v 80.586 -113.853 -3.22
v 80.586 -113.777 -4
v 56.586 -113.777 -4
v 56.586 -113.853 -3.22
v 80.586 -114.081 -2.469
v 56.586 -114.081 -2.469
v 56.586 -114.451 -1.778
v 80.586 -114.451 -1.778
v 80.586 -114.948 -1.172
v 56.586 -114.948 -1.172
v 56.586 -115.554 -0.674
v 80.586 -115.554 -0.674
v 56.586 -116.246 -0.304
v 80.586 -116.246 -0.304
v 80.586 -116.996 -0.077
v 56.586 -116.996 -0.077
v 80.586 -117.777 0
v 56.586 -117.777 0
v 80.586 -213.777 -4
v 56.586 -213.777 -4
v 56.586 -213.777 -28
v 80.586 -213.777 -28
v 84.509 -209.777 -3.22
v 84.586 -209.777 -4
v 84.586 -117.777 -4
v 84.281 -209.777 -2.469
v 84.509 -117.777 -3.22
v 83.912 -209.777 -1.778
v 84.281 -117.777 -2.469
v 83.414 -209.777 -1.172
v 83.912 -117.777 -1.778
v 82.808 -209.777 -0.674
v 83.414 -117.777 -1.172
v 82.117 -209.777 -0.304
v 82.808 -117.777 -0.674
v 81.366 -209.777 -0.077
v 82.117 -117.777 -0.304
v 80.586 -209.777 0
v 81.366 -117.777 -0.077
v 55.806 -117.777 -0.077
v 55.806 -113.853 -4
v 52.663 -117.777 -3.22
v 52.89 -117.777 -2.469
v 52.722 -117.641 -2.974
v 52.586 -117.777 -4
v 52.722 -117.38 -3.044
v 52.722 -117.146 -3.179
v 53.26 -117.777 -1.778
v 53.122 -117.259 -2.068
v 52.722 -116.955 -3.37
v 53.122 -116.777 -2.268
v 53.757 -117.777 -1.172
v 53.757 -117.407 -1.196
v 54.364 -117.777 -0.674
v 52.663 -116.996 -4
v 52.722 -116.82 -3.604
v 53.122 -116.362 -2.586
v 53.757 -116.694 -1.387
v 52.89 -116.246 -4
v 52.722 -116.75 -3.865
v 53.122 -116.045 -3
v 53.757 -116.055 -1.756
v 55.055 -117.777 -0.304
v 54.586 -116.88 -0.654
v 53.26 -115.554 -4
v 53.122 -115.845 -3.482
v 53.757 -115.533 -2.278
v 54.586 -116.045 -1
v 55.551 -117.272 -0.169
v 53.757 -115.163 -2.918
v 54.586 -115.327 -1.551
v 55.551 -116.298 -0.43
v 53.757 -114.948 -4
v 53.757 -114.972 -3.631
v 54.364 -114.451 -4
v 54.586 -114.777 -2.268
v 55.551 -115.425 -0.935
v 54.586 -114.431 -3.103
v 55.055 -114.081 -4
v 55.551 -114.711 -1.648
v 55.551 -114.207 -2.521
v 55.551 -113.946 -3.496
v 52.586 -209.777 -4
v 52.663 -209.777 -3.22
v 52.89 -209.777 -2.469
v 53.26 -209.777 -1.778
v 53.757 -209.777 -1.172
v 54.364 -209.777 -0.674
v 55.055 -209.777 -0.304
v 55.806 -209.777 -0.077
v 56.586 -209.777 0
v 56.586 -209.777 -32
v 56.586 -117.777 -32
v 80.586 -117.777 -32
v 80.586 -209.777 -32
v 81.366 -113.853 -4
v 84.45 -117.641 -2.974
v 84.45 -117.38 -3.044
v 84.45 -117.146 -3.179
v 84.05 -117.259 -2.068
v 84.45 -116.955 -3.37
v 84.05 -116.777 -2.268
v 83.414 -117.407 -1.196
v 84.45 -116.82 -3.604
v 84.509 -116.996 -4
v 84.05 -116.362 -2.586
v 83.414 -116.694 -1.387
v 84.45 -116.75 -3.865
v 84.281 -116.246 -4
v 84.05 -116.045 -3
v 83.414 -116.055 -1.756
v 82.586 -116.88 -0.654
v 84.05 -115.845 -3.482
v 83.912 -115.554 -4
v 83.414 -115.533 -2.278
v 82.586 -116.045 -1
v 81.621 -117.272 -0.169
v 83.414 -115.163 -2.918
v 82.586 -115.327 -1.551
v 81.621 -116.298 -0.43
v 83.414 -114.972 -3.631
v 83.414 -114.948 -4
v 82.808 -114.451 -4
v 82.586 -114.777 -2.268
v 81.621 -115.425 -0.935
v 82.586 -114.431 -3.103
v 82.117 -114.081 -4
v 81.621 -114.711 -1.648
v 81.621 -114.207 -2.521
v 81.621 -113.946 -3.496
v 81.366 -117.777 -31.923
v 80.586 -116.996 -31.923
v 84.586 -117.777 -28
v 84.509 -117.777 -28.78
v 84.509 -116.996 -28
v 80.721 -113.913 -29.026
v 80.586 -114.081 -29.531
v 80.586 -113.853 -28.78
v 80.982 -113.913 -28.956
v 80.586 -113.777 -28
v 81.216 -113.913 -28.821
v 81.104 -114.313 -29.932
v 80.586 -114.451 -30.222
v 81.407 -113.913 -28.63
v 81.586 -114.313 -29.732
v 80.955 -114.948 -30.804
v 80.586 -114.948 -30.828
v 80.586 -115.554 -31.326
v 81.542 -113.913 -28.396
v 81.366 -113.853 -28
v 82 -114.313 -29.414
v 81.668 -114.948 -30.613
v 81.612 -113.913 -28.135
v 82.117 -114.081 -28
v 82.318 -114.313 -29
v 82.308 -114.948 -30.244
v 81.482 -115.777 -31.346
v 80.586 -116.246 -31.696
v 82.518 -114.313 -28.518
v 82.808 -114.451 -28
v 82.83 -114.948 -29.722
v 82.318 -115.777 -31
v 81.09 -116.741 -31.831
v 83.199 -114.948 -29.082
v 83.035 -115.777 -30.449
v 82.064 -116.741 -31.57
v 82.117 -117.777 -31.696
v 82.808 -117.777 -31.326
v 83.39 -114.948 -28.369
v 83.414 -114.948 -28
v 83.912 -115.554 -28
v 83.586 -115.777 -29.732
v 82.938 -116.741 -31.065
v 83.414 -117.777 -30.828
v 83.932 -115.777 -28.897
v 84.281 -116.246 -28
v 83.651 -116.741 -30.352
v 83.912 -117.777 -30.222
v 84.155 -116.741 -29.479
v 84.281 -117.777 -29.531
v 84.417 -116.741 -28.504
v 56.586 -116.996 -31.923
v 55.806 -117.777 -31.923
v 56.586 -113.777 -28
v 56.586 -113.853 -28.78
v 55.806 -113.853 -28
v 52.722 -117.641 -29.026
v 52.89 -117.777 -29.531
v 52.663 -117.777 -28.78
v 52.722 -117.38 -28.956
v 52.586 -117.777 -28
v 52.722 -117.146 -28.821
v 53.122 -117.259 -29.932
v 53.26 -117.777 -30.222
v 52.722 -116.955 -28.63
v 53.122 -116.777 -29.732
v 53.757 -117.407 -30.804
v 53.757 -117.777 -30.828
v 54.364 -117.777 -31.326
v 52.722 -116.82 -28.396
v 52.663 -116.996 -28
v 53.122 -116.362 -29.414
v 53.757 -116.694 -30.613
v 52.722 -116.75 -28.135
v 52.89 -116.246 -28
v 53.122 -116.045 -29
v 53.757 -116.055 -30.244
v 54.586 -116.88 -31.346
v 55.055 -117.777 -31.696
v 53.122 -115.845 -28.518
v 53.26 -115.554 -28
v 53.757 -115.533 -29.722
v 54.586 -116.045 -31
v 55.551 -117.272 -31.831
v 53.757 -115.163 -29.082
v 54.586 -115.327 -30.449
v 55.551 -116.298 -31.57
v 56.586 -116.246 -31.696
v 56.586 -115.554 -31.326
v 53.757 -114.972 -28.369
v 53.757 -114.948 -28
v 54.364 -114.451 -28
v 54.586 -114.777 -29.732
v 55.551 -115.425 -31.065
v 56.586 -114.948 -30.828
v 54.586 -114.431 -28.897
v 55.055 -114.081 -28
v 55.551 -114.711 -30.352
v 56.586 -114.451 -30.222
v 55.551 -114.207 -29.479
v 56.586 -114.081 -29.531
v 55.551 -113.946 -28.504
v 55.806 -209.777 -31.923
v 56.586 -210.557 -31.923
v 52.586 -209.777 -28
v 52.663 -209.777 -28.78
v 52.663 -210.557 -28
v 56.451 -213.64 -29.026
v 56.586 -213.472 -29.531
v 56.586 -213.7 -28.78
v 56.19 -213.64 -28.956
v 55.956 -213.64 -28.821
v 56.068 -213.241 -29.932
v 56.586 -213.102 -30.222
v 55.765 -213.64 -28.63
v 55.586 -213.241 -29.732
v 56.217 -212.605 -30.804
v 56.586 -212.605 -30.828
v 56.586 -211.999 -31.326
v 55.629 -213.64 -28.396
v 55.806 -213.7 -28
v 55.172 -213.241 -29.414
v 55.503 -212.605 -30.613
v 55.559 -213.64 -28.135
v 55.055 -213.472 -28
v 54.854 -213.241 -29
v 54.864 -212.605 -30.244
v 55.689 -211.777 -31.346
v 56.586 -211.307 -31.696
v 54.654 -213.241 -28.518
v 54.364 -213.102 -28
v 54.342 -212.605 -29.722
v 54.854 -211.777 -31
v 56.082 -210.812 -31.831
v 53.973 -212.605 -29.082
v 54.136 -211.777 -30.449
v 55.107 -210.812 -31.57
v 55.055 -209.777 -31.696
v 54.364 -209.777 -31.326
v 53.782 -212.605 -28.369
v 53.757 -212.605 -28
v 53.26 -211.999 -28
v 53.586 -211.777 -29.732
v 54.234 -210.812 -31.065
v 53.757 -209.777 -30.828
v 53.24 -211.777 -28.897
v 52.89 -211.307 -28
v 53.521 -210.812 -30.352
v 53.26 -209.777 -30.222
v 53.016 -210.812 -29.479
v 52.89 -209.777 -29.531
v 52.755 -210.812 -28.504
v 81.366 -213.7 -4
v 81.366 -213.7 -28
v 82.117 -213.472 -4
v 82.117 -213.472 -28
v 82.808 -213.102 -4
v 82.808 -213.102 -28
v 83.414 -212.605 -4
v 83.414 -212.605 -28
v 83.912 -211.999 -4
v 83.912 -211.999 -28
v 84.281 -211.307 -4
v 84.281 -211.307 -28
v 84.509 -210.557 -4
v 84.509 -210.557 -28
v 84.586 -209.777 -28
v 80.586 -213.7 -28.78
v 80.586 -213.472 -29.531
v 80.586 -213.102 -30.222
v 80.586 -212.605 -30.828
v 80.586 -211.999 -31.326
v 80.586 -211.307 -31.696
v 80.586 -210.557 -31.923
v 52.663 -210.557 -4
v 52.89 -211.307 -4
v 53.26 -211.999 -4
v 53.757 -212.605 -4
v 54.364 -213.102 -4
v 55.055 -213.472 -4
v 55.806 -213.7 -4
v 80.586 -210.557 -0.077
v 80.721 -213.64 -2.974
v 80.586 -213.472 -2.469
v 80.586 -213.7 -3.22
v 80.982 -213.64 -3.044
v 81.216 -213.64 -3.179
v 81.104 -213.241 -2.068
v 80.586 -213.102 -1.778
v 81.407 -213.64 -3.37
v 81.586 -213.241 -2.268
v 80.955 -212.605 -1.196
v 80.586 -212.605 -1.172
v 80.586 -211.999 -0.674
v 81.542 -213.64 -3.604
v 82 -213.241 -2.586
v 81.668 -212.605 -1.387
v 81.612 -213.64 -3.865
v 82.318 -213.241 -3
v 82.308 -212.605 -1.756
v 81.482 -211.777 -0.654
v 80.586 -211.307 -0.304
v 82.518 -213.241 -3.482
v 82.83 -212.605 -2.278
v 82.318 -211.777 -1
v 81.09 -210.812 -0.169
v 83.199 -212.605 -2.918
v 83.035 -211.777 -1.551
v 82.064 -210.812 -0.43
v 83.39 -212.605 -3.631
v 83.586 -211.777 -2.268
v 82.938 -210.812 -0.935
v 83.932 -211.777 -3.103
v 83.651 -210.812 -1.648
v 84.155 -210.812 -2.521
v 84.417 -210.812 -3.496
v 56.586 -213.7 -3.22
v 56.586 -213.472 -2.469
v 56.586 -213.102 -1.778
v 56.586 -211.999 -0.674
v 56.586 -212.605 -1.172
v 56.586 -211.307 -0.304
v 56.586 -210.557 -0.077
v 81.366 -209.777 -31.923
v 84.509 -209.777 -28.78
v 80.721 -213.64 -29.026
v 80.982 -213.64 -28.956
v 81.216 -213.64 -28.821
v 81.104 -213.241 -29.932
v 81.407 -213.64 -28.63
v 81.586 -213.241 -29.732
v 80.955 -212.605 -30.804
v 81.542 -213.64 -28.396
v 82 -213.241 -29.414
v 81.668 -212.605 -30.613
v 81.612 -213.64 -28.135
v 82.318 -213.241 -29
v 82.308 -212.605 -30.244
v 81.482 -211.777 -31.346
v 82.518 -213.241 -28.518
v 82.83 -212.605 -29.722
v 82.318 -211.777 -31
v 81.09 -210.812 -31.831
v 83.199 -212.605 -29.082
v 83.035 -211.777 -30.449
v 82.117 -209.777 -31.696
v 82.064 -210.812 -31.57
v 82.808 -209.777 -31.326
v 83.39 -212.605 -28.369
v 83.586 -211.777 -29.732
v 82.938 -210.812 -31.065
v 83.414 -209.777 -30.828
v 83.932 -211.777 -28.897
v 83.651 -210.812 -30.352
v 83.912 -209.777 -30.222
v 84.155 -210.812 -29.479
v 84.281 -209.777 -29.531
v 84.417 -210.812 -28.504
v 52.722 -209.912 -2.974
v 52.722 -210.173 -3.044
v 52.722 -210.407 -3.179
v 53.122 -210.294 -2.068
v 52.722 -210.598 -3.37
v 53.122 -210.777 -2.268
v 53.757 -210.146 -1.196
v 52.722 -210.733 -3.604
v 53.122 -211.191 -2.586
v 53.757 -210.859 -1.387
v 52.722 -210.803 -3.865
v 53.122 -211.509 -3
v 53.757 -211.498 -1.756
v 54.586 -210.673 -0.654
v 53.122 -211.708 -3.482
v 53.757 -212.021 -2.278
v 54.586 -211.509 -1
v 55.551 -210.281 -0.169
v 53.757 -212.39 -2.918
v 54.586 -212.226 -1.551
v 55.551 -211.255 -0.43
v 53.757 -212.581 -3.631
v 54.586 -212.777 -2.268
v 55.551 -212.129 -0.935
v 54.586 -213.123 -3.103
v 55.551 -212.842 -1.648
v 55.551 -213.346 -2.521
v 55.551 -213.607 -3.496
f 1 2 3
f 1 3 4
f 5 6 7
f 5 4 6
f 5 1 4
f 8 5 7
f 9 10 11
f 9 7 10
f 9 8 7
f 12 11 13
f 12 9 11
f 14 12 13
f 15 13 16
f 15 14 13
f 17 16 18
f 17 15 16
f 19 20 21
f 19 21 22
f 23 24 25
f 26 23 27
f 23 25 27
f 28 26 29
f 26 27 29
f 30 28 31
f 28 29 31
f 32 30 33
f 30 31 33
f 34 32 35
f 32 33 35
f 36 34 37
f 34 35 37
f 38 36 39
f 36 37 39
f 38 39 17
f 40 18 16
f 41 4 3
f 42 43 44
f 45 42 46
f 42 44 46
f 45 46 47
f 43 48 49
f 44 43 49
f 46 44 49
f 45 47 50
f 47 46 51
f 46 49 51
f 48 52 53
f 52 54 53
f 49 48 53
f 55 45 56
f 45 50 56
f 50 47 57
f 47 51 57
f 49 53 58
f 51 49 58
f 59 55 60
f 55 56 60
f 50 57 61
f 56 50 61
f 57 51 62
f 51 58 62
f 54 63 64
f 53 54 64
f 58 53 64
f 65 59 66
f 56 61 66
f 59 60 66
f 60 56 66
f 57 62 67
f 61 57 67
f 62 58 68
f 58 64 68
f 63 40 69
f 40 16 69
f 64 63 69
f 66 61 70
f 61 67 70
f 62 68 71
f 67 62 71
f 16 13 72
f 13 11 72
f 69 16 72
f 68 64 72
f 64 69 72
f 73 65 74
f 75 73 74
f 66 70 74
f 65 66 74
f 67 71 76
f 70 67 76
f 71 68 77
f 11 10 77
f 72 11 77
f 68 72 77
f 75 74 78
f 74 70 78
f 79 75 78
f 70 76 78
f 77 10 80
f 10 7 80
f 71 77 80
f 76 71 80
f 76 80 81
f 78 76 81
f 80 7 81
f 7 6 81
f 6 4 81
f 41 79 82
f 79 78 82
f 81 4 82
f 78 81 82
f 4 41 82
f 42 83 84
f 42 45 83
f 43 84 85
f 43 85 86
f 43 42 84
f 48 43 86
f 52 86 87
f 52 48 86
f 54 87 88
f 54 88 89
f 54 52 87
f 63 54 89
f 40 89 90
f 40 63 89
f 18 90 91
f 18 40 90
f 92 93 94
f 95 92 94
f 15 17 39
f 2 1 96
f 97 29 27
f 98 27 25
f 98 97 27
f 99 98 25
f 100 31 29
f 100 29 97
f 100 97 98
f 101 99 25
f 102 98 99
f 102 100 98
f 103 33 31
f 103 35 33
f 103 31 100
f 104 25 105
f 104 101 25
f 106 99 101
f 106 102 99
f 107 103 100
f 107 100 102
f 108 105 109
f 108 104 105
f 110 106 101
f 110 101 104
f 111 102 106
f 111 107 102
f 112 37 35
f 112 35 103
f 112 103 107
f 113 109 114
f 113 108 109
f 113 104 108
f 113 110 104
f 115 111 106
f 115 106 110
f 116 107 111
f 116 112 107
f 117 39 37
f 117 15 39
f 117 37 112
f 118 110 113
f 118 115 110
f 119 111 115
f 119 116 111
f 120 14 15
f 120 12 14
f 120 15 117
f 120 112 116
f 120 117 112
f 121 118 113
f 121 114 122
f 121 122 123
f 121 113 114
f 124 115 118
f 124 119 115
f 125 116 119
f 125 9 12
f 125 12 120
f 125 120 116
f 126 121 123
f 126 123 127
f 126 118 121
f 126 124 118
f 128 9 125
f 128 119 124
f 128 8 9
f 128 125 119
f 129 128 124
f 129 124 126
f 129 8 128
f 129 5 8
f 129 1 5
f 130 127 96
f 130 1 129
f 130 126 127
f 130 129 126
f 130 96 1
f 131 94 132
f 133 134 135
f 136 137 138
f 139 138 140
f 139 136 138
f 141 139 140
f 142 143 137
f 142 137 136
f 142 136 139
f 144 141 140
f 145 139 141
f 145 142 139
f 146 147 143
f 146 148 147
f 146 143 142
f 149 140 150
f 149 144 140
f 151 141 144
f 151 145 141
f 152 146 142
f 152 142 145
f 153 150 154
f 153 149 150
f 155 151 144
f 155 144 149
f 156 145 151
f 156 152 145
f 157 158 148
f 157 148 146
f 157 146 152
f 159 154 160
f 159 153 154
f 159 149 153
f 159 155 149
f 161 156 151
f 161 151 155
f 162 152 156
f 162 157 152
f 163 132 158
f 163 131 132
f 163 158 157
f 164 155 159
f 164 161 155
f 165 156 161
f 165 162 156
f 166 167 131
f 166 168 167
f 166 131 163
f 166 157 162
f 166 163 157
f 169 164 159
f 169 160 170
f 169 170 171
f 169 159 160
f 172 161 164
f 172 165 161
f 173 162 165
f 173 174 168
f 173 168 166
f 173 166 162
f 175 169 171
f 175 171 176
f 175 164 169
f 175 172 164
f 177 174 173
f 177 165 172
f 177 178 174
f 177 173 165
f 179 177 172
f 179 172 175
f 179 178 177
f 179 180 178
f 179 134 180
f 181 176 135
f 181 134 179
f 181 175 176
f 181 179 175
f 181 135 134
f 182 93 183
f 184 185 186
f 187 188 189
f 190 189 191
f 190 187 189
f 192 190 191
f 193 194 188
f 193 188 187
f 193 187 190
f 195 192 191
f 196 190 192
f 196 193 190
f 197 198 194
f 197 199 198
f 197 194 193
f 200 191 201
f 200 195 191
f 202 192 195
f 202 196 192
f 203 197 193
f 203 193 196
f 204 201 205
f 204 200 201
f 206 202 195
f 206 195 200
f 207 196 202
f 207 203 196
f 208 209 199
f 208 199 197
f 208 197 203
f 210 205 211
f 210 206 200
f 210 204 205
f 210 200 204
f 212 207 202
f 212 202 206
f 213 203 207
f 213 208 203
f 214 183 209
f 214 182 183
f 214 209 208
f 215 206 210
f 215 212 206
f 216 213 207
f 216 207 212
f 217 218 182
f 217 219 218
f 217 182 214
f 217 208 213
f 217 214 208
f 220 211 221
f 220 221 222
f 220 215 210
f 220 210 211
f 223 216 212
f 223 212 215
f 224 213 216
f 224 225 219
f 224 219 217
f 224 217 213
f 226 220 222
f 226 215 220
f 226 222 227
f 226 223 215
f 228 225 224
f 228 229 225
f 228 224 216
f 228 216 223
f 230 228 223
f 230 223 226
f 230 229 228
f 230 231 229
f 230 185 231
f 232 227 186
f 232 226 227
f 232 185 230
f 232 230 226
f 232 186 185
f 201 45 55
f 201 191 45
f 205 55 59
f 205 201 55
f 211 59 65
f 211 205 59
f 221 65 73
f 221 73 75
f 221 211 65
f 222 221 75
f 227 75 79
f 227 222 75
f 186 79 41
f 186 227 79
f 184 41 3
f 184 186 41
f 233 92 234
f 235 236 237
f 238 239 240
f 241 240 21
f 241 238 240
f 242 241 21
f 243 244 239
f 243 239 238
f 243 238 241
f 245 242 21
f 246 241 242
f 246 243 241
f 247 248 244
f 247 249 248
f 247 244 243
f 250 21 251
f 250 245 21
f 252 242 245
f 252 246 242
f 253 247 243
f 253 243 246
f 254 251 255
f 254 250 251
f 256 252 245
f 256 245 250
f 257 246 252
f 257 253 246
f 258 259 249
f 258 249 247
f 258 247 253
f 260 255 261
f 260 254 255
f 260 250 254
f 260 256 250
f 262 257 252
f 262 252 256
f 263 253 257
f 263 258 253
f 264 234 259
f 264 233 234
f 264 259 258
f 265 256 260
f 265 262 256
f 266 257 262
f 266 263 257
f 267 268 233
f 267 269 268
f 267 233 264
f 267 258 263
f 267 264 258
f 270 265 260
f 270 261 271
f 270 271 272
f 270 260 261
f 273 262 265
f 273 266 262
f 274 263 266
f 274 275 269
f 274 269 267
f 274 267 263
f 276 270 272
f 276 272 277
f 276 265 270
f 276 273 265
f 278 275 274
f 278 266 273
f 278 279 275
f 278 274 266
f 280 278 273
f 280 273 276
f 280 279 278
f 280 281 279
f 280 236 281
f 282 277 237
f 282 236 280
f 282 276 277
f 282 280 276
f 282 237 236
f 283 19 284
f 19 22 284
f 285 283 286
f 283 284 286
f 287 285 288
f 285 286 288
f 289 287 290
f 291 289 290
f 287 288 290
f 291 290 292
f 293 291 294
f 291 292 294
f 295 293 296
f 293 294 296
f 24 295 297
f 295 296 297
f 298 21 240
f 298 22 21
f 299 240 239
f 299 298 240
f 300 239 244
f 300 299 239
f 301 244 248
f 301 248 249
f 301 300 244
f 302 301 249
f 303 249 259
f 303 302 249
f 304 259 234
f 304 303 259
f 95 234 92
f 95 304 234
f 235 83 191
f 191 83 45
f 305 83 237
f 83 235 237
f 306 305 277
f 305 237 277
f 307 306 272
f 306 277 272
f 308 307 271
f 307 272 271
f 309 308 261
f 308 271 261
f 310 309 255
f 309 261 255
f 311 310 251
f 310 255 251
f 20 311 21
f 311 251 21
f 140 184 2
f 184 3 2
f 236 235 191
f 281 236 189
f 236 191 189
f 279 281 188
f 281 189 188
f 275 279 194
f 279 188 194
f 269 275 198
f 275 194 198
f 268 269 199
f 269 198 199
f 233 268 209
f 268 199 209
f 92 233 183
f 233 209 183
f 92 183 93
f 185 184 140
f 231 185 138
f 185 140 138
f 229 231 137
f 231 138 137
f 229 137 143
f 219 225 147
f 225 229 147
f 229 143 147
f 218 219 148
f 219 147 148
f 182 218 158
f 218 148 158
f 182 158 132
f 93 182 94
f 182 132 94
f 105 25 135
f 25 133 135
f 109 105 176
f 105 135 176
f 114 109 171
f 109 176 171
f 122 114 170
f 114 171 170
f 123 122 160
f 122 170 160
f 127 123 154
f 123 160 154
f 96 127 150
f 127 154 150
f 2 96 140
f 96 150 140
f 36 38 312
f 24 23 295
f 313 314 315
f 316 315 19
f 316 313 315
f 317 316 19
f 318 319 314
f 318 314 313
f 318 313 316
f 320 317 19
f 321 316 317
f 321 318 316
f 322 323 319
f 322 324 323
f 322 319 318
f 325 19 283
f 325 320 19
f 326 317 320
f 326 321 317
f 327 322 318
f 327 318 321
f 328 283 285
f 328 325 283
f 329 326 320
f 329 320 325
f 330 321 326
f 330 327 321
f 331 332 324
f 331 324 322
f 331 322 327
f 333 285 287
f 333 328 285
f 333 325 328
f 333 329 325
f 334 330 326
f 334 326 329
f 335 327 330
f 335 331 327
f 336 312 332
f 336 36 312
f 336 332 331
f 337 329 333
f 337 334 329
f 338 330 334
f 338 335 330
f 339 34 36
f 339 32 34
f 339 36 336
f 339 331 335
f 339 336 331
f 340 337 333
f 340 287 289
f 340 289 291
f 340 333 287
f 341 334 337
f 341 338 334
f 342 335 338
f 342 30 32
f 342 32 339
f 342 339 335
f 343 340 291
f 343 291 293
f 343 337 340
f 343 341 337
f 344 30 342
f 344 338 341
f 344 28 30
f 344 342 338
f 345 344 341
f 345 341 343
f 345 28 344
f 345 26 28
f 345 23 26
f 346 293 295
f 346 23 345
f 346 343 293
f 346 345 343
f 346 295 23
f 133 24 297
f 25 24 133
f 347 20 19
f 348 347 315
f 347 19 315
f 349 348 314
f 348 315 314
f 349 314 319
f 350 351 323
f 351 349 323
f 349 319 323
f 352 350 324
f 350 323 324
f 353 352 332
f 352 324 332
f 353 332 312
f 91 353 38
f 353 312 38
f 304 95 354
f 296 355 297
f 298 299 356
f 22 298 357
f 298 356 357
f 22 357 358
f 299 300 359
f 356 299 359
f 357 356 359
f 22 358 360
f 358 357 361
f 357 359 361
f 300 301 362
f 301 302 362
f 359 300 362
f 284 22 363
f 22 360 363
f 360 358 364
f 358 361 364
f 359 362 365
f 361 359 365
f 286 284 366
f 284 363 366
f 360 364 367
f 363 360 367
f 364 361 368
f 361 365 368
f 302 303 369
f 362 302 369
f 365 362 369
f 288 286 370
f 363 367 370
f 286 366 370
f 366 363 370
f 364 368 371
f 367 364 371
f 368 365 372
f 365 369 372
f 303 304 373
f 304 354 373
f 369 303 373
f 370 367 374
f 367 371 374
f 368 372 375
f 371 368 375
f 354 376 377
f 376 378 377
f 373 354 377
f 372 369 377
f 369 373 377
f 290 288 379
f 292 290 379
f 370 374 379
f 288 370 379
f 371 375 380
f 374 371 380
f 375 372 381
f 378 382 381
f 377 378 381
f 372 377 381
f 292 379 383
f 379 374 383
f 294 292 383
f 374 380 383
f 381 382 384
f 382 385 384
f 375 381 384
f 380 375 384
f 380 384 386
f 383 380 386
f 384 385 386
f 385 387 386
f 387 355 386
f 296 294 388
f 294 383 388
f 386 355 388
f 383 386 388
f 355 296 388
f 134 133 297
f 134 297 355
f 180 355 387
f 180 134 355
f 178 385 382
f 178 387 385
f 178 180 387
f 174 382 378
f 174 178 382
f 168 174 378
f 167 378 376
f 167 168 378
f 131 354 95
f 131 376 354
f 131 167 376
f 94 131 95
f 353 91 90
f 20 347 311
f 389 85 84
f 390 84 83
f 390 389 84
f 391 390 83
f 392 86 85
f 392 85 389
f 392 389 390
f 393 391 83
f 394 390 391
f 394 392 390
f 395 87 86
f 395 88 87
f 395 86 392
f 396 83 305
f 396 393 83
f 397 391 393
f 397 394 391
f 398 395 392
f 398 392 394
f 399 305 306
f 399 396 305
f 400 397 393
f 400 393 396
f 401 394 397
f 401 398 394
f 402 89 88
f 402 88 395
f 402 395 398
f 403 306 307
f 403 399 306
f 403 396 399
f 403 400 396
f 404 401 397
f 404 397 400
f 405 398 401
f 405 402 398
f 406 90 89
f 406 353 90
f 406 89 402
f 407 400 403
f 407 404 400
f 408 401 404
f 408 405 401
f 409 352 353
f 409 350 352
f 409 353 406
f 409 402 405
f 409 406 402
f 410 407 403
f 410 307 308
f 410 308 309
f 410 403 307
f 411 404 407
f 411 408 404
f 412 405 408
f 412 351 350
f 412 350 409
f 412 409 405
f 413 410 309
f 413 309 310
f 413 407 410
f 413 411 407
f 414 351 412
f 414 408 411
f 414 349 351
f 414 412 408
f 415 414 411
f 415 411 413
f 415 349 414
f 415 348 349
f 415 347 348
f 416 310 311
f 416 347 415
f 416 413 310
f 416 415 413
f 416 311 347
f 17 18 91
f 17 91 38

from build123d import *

# Parameters (mm, degrees)
SKETCH1_W           = 32
SKETCH1_H           = 100
BOSS_EXTRUDE1_DEPTH = 32
FILLET1_R           = 4


with BuildPart() as part:
    # Sketch1 → Boss-Extrude1 (new body)
    with BuildSketch(Plane.XY):
        with Locations((68.585871194, -163.776616404)):
            Rectangle(SKETCH1_W, SKETCH1_H)
    extrude(amount=-BOSS_EXTRUDE1_DEPTH)

    # Fillet1
    fillet1_edges = [part.edges().sort_by_distance(p)[0] for p in [
        (84.585871194, -163.776616404, -32),
        (68.585871194, -113.776616404, -32),
        (52.585871194, -163.776616404, -32),
        (68.585871194, -113.776616404, 0),
        (84.585871194, -163.776616404, 0),
        (68.585871194, -213.776616404, 0),
        (52.585871194, -163.776616404, 0),
        (68.585871194, -213.776616404, -32),
        (52.585871194, -113.776616404, -16),
        (84.585871194, -113.776616404, -16),
        (84.585871194, -213.776616404, -16),
        (52.585871194, -213.776616404, -16),
    ]]
    fillet(fillet1_edges, radius=FILLET1_R)


solid = part.part
